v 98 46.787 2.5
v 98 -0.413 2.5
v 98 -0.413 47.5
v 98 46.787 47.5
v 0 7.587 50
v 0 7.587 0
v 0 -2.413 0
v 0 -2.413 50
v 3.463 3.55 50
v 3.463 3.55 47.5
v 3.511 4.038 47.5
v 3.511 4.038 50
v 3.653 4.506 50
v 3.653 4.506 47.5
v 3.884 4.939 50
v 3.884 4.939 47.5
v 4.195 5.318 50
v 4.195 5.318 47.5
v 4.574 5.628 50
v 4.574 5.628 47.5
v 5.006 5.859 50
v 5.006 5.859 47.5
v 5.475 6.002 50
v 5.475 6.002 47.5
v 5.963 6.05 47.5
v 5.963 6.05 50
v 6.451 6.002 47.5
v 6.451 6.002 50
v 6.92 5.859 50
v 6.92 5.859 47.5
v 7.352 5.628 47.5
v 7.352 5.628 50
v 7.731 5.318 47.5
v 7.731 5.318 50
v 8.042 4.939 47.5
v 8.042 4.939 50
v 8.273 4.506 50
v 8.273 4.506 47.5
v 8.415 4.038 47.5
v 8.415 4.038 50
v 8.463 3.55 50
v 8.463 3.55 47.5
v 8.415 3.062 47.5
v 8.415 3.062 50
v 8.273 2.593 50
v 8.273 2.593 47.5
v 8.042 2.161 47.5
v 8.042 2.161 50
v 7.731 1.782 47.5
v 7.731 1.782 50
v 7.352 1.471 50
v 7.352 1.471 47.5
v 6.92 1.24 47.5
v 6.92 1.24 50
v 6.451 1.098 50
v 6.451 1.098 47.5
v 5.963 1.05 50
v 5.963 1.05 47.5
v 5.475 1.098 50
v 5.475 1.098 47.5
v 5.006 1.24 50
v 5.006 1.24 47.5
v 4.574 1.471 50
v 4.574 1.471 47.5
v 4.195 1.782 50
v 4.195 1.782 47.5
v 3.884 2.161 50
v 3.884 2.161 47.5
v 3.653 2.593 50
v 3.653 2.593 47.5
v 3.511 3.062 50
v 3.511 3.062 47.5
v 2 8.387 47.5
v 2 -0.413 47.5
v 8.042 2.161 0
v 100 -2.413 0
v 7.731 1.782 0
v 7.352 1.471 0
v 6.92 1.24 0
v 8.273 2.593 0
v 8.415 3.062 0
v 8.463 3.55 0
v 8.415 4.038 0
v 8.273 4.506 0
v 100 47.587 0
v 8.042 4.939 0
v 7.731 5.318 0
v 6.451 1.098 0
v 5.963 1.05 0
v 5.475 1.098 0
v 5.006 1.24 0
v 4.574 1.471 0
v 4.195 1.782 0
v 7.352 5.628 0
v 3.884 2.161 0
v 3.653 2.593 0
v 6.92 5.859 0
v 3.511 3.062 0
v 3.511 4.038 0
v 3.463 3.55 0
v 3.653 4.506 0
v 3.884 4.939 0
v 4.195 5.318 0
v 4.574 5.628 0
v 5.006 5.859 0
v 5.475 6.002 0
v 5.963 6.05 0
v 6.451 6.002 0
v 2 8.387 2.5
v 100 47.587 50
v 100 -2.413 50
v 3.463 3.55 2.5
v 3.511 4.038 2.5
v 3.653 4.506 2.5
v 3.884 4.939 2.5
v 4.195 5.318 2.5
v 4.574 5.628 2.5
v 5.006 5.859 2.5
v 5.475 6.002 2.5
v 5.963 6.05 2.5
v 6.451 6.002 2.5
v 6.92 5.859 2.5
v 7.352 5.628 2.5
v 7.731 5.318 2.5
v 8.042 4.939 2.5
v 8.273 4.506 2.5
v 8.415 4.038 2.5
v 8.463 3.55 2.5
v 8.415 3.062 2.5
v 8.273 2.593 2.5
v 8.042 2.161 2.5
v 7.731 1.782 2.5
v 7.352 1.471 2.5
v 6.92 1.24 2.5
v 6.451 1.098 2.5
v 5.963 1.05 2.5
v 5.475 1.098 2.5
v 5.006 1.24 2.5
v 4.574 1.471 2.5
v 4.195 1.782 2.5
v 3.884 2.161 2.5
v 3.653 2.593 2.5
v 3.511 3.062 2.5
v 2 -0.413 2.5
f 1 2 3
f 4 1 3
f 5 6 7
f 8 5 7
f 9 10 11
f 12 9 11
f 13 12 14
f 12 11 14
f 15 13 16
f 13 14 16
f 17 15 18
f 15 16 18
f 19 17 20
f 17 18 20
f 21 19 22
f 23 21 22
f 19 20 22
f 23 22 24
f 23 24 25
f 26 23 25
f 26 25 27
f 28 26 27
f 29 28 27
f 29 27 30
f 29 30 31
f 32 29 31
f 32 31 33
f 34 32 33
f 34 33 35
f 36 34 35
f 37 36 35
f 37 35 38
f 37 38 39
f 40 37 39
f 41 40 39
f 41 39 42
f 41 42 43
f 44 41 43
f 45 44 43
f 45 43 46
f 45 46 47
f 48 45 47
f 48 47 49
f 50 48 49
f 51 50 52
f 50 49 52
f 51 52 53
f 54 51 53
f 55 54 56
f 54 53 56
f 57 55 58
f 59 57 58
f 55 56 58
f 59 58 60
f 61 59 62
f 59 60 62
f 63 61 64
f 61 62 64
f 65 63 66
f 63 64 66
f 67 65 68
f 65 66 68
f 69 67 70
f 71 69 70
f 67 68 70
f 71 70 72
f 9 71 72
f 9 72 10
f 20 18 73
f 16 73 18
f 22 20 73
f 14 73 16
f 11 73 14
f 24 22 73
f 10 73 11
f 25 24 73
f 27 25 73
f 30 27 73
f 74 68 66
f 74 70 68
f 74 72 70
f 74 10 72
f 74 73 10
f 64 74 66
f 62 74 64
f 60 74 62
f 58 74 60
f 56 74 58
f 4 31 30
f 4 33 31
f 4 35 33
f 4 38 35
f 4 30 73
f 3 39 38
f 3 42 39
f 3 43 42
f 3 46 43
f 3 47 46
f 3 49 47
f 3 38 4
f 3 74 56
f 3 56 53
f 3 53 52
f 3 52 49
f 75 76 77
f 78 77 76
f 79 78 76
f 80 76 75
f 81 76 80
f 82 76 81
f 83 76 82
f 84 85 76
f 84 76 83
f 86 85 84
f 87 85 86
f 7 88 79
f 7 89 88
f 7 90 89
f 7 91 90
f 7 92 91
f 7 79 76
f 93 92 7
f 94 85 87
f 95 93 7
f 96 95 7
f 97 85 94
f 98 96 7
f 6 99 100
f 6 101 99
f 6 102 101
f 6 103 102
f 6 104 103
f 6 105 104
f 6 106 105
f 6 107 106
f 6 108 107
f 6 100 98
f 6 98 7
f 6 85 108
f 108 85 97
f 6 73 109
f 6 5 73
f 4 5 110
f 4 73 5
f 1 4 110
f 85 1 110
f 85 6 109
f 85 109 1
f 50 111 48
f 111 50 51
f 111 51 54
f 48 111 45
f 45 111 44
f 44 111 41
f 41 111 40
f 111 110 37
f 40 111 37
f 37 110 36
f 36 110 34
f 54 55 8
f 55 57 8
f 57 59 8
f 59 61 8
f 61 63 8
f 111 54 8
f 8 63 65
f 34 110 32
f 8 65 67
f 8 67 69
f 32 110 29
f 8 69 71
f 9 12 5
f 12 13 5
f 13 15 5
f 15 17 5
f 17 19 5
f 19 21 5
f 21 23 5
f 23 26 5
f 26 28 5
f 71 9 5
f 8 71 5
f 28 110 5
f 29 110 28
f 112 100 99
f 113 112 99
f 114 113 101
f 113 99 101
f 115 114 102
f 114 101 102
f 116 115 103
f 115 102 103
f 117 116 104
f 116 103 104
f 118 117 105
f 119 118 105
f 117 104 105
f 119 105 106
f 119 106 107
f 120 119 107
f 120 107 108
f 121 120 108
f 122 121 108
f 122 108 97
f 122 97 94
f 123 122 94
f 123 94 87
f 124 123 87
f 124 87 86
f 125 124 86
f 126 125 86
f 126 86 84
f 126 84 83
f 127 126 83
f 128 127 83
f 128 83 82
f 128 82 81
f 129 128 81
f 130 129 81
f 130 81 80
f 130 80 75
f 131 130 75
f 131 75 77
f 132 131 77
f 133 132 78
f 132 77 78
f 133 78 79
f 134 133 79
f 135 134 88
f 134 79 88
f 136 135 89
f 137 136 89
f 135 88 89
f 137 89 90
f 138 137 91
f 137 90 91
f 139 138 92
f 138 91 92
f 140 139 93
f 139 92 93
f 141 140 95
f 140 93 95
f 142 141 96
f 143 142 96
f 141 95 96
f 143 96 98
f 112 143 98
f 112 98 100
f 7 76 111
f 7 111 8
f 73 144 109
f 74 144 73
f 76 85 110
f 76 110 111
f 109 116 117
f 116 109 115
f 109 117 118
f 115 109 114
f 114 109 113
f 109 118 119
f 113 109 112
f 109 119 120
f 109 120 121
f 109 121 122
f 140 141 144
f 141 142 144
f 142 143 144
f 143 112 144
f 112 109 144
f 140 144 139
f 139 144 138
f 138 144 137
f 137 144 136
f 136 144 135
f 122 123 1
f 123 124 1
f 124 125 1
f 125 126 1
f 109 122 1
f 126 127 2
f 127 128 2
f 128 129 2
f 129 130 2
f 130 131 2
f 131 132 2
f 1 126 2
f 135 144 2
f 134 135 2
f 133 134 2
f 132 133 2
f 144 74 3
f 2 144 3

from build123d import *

# Parameters (mm, degrees)
BOSS_EXTRUDE1_DEPTH = 50
CUT_EXTRUDE9_START  = -2
SKETCH3_W           = 96
SKETCH3_H           = 45
CUT_EXTRUDE9_DEPTH  = 121.474487139
SKETCH4_R           = 2.5
CUT_EXTRUDE10_DEPTH = 122.509301877


with BuildPart() as part:
    # Sketch1 → Boss-Extrude1 (new body)
    with BuildSketch(Plane.XY):
        Polygon((0, 0.250965251), (0, 7.586872587), (100, 47.586872587), (100, -2.413127413), (0, -2.413127413), align=None)
    extrude(amount=BOSS_EXTRUDE1_DEPTH)

    # Sketch3 → Cut-Extrude9 (cut, through all)
    with BuildSketch(Plane.XZ.offset(2.413127413).offset(CUT_EXTRUDE9_START)):
        with Locations((50, 25)):
            Rectangle(SKETCH3_W, SKETCH3_H)
    extrude(amount=-CUT_EXTRUDE9_DEPTH, mode=Mode.SUBTRACT)

    # Sketch4 → Cut-Extrude10 (cut, through all)
    with BuildSketch(Plane(origin=(0, 0, 0), x_dir=(-1, 0, 0), z_dir=(0, 0, -1))):
        with Locations((-5.962912018, 3.549784605)):
            Circle(SKETCH4_R)
    extrude(amount=-CUT_EXTRUDE10_DEPTH, mode=Mode.SUBTRACT)


solid = part.part
